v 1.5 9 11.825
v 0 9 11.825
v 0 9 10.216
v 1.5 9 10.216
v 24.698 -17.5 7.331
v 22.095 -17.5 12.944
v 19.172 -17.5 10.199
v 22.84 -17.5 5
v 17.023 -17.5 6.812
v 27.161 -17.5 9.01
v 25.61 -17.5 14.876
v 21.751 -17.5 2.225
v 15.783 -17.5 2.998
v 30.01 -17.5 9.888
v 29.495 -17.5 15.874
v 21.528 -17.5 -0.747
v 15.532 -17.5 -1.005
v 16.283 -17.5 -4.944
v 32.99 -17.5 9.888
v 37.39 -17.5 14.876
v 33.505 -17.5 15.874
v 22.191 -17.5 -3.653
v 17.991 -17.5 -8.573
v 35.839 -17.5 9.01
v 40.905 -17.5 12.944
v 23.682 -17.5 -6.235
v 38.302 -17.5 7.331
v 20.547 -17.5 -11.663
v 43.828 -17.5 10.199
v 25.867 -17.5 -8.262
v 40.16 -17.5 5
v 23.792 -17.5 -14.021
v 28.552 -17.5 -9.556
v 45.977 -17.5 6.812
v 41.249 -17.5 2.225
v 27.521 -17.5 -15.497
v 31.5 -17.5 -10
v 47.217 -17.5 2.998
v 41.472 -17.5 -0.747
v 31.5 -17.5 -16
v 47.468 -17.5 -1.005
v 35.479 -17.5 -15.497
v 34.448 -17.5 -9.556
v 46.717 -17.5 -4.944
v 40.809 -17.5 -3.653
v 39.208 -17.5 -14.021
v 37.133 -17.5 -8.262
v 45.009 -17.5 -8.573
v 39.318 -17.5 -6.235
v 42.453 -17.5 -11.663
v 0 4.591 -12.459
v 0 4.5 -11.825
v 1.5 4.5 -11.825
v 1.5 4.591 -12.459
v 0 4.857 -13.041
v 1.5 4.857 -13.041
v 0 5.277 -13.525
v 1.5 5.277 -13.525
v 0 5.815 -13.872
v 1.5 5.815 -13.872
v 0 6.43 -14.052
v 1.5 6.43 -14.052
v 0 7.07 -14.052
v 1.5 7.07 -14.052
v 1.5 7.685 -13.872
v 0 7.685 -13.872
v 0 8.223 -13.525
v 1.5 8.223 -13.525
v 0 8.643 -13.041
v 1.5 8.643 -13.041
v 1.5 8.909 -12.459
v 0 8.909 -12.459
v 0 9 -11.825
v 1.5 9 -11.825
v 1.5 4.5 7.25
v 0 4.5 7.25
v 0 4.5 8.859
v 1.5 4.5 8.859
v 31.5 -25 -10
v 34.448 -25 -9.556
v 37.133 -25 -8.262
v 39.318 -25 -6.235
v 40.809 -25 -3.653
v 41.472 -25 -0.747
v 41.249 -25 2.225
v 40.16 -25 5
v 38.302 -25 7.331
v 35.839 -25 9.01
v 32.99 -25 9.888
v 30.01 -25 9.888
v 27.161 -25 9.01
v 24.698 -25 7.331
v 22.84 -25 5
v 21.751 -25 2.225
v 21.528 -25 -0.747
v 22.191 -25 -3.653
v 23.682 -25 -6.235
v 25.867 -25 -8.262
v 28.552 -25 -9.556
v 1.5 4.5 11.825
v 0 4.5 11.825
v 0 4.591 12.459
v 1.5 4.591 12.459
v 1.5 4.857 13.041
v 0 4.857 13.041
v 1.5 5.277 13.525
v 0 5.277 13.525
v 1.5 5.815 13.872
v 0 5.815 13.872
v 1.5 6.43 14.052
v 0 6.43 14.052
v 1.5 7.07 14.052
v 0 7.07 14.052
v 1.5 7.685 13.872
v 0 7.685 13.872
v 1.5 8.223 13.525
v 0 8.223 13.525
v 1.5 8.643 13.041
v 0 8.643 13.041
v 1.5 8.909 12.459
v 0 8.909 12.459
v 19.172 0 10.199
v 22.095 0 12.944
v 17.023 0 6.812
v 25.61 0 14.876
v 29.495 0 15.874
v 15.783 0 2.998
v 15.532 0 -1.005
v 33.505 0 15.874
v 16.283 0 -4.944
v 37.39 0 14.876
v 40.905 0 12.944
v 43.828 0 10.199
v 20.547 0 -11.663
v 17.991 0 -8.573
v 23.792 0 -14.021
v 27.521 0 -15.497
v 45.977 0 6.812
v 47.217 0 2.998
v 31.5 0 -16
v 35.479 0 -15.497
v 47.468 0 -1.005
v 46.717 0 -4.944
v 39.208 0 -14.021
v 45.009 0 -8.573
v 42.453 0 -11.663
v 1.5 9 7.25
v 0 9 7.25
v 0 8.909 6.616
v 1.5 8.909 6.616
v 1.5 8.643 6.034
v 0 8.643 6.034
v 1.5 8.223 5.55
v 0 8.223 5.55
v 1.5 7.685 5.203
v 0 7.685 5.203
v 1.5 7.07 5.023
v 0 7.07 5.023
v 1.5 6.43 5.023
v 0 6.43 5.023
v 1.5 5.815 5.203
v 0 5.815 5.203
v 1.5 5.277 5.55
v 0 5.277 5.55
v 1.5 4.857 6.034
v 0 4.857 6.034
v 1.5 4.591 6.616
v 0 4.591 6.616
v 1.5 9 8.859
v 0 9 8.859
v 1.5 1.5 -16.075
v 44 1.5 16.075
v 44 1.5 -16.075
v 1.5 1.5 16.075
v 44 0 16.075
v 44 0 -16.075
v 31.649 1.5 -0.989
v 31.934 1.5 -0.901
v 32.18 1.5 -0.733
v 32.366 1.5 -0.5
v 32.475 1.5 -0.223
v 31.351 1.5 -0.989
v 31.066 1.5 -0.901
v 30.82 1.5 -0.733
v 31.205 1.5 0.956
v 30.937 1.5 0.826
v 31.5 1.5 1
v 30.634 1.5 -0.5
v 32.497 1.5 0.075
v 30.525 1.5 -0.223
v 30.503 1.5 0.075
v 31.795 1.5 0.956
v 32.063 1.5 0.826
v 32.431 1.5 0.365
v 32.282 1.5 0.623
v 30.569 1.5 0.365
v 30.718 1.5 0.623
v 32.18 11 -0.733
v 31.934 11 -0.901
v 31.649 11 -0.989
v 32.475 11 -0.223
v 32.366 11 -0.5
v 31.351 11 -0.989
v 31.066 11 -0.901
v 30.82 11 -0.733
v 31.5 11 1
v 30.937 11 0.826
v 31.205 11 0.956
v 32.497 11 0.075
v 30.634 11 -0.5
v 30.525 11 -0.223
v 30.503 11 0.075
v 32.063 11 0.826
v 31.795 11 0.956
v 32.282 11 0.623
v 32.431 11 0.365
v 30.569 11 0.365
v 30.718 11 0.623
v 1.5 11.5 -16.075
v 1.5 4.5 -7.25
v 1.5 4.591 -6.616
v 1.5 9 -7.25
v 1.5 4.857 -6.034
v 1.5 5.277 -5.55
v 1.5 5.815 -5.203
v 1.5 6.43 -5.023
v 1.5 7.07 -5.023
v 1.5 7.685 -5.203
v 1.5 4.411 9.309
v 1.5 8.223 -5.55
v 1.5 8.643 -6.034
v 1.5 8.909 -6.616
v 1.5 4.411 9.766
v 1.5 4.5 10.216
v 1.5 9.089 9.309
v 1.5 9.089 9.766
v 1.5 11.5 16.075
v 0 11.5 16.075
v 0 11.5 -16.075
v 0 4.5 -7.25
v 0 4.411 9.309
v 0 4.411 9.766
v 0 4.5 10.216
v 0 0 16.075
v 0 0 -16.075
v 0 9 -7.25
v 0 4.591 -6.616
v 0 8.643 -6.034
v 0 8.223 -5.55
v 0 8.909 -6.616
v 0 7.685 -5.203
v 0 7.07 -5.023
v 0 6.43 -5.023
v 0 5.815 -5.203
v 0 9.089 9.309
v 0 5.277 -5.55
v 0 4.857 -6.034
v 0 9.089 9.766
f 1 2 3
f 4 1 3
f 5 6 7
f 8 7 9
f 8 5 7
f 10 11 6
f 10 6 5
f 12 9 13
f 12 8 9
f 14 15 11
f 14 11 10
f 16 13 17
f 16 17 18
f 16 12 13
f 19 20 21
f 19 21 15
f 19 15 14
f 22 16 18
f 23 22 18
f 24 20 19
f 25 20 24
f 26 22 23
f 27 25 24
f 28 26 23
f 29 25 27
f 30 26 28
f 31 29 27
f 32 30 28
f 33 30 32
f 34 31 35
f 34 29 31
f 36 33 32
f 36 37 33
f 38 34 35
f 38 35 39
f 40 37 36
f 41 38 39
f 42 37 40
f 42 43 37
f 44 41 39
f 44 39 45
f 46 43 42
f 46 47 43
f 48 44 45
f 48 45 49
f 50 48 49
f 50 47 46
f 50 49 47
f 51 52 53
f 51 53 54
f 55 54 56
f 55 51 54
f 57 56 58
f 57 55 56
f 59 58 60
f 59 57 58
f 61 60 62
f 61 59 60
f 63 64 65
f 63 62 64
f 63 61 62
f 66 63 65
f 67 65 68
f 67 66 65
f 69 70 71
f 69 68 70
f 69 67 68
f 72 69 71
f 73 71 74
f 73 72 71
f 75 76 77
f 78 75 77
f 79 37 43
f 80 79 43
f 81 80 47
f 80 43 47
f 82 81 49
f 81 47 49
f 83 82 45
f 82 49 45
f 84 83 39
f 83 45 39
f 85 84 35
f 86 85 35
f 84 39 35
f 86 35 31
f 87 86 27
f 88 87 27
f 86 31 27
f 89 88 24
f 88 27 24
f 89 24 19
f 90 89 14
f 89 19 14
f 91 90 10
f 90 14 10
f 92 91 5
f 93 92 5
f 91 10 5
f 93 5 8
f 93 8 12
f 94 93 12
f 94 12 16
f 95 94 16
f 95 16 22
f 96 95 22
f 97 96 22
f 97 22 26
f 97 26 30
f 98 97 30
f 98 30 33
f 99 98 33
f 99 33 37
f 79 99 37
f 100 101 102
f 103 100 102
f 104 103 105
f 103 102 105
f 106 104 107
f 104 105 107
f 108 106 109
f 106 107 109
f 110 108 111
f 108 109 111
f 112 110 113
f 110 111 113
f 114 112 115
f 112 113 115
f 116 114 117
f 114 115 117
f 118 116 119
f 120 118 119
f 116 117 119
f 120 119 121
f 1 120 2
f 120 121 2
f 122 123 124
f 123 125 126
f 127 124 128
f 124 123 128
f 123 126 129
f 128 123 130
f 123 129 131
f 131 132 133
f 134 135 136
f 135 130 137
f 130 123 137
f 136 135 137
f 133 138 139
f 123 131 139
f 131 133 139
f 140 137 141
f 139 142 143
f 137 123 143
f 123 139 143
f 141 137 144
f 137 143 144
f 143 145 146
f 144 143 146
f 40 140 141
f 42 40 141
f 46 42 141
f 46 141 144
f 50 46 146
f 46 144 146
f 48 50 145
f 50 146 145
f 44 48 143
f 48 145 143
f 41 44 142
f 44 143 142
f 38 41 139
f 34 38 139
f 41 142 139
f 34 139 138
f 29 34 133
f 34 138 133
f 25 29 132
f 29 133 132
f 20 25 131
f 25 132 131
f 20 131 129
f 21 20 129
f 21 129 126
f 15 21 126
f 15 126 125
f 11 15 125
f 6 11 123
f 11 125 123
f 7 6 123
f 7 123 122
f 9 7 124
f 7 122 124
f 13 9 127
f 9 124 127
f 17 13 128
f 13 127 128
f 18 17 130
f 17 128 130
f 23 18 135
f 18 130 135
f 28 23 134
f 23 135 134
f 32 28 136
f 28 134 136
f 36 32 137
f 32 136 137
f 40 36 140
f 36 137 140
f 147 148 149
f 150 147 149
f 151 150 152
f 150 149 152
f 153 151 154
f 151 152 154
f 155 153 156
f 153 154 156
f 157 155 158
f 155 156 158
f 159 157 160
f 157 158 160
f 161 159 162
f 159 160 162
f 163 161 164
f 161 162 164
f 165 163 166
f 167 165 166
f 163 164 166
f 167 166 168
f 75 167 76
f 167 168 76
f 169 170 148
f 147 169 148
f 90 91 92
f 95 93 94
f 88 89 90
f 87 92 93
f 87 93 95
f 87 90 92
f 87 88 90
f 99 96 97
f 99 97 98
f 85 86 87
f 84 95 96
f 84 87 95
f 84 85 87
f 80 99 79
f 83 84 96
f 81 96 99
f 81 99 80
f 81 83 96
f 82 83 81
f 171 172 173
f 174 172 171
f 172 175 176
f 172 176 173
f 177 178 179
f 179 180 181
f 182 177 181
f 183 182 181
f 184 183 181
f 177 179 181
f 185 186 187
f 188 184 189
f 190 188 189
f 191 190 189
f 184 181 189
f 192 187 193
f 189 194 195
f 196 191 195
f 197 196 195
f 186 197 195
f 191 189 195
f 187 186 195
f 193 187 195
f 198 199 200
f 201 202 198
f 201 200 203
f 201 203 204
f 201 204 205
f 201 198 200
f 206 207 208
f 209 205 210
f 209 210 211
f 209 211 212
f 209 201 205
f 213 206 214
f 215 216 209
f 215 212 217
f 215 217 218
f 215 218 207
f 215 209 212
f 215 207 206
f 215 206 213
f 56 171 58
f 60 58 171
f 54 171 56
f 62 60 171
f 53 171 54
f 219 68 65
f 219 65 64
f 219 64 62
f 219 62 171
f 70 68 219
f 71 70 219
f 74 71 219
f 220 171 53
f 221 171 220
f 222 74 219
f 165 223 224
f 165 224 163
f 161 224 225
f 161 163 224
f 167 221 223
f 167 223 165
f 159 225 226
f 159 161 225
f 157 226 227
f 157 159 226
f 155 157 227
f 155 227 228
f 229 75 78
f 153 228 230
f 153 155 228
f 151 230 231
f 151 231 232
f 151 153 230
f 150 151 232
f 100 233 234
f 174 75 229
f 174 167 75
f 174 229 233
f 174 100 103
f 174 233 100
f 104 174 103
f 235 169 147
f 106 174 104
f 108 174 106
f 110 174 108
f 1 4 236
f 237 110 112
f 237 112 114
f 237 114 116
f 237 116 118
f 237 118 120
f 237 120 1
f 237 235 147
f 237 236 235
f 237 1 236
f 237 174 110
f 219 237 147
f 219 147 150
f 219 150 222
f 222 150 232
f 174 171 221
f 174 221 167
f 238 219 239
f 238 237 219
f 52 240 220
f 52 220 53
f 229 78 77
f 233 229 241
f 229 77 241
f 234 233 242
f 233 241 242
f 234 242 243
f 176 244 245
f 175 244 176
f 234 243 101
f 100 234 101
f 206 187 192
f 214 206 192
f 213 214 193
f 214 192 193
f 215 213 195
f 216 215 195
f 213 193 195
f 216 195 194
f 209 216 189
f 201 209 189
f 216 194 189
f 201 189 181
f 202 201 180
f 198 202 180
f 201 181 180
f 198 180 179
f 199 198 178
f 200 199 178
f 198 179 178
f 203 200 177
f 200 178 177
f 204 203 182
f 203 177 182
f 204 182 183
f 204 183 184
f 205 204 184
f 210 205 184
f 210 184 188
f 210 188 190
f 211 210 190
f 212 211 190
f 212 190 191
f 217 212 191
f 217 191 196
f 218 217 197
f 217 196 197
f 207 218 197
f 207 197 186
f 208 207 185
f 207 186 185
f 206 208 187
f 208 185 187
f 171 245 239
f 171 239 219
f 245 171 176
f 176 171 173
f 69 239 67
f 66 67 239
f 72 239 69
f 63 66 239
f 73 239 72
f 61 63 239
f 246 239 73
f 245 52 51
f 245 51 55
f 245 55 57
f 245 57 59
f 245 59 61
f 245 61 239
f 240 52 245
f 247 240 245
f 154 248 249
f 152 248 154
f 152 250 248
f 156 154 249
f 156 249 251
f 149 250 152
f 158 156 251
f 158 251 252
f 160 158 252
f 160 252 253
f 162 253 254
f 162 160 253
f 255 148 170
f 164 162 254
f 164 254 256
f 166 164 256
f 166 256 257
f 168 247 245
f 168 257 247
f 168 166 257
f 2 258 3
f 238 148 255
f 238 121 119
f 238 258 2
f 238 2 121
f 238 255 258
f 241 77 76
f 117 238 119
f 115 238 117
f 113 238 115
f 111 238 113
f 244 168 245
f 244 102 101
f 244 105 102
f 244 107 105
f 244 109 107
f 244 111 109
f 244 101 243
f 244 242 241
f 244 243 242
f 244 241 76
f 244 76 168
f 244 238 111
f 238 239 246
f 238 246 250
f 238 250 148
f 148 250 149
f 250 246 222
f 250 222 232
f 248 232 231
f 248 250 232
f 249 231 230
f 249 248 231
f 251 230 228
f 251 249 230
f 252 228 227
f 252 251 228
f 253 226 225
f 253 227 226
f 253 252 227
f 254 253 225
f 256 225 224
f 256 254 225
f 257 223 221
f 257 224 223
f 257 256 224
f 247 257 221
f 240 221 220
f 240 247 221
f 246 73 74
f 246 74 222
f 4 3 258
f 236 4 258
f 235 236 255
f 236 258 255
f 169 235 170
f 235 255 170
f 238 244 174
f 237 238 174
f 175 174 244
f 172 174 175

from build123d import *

# Parameters (mm, degrees)
EXTRU_MINCE1_DEPTH      = 16.075
ENL_V_MAT_EXTRU_1_DEPTH = 3
ESQUISSE3_R             = 1
BOSS_EXTRU_1_DEPTH      = 9.5
ESQUISSE4_R             = 16
BOSS_EXTRU_2_DEPTH      = 17.5
ESQUISSE5_R             = 2.35
ENL_V_MAT_EXTRU_2_DEPTH = 54.112198458
ESQUISSE6_R             = 10
BOSS_EXTRU_3_DEPTH      = 25


with BuildPart() as part:
    # Esquisse1 → Extru.-Mince1 (new, symmetric)
    with BuildSketch(Plane.XY):
        Polygon((0, 11.5), (0, 0), (44, 0), (44, 1.5), (1.5, 1.5), (1.5, 11.5), align=None)
    extrude(amount=EXTRU_MINCE1_DEPTH, both=True)

    # Esquisse2 → Enlèv. mat.-Extru.1 (cut)
    with BuildSketch(Plane.ZY):
        with BuildLine():
            Line((-11.825, 9), (-7.25, 9))
            ThreePointArc((-7.25, 9), (-5, 6.75), (-7.25, 4.5))
            Line((-7.25, 4.5), (-11.825, 4.5))
            ThreePointArc((-11.825, 4.5), (-14.075, 6.75), (-11.825, 9))
        make_face()
        with BuildLine():
            Line((11.825, 9), (7.25, 9))
            ThreePointArc((7.25, 9), (5, 6.75), (7.25, 4.5))
            Line((7.25, 4.5), (11.825, 4.5))
            ThreePointArc((11.825, 4.5), (14.075, 6.75), (11.825, 9))
        make_face()
    extrude(amount=-ENL_V_MAT_EXTRU_1_DEPTH, mode=Mode.SUBTRACT)

    # Esquisse5 → Enlèv. mat.-Extru.2 (cut, through all)
    with BuildSketch(Plane.ZY):
        with Locations((9.5375, 6.75)):
            Circle(ESQUISSE5_R)
    extrude(amount=-ENL_V_MAT_EXTRU_2_DEPTH, mode=Mode.SUBTRACT)


with BuildPart() as body_2:
    # Esquisse3 → Boss.-Extru.1 (new body)
    with BuildSketch(Plane(origin=(0, 1.5, 0), x_dir=(1, 0, 0), z_dir=(0, 1, 0))):
        with Locations((31.5, 0)):
            Circle(ESQUISSE3_R)
    extrude(amount=BOSS_EXTRU_1_DEPTH)


with BuildPart() as body_3:
    # Esquisse4 → Boss.-Extru.2 (new body)
    with BuildSketch(Plane.XZ):
        with Locations((31.5, 0)):
            Circle(ESQUISSE4_R)
    extrude(amount=BOSS_EXTRU_2_DEPTH)

    # Esquisse6 → Boss.-Extru.3 (add)
    with BuildSketch(Plane.XZ):
        with Locations((31.5, 0)):
            Circle(ESQUISSE6_R)
    extrude(amount=BOSS_EXTRU_3_DEPTH)


solid = Compound([part.part, body_2.part, body_3.part])
